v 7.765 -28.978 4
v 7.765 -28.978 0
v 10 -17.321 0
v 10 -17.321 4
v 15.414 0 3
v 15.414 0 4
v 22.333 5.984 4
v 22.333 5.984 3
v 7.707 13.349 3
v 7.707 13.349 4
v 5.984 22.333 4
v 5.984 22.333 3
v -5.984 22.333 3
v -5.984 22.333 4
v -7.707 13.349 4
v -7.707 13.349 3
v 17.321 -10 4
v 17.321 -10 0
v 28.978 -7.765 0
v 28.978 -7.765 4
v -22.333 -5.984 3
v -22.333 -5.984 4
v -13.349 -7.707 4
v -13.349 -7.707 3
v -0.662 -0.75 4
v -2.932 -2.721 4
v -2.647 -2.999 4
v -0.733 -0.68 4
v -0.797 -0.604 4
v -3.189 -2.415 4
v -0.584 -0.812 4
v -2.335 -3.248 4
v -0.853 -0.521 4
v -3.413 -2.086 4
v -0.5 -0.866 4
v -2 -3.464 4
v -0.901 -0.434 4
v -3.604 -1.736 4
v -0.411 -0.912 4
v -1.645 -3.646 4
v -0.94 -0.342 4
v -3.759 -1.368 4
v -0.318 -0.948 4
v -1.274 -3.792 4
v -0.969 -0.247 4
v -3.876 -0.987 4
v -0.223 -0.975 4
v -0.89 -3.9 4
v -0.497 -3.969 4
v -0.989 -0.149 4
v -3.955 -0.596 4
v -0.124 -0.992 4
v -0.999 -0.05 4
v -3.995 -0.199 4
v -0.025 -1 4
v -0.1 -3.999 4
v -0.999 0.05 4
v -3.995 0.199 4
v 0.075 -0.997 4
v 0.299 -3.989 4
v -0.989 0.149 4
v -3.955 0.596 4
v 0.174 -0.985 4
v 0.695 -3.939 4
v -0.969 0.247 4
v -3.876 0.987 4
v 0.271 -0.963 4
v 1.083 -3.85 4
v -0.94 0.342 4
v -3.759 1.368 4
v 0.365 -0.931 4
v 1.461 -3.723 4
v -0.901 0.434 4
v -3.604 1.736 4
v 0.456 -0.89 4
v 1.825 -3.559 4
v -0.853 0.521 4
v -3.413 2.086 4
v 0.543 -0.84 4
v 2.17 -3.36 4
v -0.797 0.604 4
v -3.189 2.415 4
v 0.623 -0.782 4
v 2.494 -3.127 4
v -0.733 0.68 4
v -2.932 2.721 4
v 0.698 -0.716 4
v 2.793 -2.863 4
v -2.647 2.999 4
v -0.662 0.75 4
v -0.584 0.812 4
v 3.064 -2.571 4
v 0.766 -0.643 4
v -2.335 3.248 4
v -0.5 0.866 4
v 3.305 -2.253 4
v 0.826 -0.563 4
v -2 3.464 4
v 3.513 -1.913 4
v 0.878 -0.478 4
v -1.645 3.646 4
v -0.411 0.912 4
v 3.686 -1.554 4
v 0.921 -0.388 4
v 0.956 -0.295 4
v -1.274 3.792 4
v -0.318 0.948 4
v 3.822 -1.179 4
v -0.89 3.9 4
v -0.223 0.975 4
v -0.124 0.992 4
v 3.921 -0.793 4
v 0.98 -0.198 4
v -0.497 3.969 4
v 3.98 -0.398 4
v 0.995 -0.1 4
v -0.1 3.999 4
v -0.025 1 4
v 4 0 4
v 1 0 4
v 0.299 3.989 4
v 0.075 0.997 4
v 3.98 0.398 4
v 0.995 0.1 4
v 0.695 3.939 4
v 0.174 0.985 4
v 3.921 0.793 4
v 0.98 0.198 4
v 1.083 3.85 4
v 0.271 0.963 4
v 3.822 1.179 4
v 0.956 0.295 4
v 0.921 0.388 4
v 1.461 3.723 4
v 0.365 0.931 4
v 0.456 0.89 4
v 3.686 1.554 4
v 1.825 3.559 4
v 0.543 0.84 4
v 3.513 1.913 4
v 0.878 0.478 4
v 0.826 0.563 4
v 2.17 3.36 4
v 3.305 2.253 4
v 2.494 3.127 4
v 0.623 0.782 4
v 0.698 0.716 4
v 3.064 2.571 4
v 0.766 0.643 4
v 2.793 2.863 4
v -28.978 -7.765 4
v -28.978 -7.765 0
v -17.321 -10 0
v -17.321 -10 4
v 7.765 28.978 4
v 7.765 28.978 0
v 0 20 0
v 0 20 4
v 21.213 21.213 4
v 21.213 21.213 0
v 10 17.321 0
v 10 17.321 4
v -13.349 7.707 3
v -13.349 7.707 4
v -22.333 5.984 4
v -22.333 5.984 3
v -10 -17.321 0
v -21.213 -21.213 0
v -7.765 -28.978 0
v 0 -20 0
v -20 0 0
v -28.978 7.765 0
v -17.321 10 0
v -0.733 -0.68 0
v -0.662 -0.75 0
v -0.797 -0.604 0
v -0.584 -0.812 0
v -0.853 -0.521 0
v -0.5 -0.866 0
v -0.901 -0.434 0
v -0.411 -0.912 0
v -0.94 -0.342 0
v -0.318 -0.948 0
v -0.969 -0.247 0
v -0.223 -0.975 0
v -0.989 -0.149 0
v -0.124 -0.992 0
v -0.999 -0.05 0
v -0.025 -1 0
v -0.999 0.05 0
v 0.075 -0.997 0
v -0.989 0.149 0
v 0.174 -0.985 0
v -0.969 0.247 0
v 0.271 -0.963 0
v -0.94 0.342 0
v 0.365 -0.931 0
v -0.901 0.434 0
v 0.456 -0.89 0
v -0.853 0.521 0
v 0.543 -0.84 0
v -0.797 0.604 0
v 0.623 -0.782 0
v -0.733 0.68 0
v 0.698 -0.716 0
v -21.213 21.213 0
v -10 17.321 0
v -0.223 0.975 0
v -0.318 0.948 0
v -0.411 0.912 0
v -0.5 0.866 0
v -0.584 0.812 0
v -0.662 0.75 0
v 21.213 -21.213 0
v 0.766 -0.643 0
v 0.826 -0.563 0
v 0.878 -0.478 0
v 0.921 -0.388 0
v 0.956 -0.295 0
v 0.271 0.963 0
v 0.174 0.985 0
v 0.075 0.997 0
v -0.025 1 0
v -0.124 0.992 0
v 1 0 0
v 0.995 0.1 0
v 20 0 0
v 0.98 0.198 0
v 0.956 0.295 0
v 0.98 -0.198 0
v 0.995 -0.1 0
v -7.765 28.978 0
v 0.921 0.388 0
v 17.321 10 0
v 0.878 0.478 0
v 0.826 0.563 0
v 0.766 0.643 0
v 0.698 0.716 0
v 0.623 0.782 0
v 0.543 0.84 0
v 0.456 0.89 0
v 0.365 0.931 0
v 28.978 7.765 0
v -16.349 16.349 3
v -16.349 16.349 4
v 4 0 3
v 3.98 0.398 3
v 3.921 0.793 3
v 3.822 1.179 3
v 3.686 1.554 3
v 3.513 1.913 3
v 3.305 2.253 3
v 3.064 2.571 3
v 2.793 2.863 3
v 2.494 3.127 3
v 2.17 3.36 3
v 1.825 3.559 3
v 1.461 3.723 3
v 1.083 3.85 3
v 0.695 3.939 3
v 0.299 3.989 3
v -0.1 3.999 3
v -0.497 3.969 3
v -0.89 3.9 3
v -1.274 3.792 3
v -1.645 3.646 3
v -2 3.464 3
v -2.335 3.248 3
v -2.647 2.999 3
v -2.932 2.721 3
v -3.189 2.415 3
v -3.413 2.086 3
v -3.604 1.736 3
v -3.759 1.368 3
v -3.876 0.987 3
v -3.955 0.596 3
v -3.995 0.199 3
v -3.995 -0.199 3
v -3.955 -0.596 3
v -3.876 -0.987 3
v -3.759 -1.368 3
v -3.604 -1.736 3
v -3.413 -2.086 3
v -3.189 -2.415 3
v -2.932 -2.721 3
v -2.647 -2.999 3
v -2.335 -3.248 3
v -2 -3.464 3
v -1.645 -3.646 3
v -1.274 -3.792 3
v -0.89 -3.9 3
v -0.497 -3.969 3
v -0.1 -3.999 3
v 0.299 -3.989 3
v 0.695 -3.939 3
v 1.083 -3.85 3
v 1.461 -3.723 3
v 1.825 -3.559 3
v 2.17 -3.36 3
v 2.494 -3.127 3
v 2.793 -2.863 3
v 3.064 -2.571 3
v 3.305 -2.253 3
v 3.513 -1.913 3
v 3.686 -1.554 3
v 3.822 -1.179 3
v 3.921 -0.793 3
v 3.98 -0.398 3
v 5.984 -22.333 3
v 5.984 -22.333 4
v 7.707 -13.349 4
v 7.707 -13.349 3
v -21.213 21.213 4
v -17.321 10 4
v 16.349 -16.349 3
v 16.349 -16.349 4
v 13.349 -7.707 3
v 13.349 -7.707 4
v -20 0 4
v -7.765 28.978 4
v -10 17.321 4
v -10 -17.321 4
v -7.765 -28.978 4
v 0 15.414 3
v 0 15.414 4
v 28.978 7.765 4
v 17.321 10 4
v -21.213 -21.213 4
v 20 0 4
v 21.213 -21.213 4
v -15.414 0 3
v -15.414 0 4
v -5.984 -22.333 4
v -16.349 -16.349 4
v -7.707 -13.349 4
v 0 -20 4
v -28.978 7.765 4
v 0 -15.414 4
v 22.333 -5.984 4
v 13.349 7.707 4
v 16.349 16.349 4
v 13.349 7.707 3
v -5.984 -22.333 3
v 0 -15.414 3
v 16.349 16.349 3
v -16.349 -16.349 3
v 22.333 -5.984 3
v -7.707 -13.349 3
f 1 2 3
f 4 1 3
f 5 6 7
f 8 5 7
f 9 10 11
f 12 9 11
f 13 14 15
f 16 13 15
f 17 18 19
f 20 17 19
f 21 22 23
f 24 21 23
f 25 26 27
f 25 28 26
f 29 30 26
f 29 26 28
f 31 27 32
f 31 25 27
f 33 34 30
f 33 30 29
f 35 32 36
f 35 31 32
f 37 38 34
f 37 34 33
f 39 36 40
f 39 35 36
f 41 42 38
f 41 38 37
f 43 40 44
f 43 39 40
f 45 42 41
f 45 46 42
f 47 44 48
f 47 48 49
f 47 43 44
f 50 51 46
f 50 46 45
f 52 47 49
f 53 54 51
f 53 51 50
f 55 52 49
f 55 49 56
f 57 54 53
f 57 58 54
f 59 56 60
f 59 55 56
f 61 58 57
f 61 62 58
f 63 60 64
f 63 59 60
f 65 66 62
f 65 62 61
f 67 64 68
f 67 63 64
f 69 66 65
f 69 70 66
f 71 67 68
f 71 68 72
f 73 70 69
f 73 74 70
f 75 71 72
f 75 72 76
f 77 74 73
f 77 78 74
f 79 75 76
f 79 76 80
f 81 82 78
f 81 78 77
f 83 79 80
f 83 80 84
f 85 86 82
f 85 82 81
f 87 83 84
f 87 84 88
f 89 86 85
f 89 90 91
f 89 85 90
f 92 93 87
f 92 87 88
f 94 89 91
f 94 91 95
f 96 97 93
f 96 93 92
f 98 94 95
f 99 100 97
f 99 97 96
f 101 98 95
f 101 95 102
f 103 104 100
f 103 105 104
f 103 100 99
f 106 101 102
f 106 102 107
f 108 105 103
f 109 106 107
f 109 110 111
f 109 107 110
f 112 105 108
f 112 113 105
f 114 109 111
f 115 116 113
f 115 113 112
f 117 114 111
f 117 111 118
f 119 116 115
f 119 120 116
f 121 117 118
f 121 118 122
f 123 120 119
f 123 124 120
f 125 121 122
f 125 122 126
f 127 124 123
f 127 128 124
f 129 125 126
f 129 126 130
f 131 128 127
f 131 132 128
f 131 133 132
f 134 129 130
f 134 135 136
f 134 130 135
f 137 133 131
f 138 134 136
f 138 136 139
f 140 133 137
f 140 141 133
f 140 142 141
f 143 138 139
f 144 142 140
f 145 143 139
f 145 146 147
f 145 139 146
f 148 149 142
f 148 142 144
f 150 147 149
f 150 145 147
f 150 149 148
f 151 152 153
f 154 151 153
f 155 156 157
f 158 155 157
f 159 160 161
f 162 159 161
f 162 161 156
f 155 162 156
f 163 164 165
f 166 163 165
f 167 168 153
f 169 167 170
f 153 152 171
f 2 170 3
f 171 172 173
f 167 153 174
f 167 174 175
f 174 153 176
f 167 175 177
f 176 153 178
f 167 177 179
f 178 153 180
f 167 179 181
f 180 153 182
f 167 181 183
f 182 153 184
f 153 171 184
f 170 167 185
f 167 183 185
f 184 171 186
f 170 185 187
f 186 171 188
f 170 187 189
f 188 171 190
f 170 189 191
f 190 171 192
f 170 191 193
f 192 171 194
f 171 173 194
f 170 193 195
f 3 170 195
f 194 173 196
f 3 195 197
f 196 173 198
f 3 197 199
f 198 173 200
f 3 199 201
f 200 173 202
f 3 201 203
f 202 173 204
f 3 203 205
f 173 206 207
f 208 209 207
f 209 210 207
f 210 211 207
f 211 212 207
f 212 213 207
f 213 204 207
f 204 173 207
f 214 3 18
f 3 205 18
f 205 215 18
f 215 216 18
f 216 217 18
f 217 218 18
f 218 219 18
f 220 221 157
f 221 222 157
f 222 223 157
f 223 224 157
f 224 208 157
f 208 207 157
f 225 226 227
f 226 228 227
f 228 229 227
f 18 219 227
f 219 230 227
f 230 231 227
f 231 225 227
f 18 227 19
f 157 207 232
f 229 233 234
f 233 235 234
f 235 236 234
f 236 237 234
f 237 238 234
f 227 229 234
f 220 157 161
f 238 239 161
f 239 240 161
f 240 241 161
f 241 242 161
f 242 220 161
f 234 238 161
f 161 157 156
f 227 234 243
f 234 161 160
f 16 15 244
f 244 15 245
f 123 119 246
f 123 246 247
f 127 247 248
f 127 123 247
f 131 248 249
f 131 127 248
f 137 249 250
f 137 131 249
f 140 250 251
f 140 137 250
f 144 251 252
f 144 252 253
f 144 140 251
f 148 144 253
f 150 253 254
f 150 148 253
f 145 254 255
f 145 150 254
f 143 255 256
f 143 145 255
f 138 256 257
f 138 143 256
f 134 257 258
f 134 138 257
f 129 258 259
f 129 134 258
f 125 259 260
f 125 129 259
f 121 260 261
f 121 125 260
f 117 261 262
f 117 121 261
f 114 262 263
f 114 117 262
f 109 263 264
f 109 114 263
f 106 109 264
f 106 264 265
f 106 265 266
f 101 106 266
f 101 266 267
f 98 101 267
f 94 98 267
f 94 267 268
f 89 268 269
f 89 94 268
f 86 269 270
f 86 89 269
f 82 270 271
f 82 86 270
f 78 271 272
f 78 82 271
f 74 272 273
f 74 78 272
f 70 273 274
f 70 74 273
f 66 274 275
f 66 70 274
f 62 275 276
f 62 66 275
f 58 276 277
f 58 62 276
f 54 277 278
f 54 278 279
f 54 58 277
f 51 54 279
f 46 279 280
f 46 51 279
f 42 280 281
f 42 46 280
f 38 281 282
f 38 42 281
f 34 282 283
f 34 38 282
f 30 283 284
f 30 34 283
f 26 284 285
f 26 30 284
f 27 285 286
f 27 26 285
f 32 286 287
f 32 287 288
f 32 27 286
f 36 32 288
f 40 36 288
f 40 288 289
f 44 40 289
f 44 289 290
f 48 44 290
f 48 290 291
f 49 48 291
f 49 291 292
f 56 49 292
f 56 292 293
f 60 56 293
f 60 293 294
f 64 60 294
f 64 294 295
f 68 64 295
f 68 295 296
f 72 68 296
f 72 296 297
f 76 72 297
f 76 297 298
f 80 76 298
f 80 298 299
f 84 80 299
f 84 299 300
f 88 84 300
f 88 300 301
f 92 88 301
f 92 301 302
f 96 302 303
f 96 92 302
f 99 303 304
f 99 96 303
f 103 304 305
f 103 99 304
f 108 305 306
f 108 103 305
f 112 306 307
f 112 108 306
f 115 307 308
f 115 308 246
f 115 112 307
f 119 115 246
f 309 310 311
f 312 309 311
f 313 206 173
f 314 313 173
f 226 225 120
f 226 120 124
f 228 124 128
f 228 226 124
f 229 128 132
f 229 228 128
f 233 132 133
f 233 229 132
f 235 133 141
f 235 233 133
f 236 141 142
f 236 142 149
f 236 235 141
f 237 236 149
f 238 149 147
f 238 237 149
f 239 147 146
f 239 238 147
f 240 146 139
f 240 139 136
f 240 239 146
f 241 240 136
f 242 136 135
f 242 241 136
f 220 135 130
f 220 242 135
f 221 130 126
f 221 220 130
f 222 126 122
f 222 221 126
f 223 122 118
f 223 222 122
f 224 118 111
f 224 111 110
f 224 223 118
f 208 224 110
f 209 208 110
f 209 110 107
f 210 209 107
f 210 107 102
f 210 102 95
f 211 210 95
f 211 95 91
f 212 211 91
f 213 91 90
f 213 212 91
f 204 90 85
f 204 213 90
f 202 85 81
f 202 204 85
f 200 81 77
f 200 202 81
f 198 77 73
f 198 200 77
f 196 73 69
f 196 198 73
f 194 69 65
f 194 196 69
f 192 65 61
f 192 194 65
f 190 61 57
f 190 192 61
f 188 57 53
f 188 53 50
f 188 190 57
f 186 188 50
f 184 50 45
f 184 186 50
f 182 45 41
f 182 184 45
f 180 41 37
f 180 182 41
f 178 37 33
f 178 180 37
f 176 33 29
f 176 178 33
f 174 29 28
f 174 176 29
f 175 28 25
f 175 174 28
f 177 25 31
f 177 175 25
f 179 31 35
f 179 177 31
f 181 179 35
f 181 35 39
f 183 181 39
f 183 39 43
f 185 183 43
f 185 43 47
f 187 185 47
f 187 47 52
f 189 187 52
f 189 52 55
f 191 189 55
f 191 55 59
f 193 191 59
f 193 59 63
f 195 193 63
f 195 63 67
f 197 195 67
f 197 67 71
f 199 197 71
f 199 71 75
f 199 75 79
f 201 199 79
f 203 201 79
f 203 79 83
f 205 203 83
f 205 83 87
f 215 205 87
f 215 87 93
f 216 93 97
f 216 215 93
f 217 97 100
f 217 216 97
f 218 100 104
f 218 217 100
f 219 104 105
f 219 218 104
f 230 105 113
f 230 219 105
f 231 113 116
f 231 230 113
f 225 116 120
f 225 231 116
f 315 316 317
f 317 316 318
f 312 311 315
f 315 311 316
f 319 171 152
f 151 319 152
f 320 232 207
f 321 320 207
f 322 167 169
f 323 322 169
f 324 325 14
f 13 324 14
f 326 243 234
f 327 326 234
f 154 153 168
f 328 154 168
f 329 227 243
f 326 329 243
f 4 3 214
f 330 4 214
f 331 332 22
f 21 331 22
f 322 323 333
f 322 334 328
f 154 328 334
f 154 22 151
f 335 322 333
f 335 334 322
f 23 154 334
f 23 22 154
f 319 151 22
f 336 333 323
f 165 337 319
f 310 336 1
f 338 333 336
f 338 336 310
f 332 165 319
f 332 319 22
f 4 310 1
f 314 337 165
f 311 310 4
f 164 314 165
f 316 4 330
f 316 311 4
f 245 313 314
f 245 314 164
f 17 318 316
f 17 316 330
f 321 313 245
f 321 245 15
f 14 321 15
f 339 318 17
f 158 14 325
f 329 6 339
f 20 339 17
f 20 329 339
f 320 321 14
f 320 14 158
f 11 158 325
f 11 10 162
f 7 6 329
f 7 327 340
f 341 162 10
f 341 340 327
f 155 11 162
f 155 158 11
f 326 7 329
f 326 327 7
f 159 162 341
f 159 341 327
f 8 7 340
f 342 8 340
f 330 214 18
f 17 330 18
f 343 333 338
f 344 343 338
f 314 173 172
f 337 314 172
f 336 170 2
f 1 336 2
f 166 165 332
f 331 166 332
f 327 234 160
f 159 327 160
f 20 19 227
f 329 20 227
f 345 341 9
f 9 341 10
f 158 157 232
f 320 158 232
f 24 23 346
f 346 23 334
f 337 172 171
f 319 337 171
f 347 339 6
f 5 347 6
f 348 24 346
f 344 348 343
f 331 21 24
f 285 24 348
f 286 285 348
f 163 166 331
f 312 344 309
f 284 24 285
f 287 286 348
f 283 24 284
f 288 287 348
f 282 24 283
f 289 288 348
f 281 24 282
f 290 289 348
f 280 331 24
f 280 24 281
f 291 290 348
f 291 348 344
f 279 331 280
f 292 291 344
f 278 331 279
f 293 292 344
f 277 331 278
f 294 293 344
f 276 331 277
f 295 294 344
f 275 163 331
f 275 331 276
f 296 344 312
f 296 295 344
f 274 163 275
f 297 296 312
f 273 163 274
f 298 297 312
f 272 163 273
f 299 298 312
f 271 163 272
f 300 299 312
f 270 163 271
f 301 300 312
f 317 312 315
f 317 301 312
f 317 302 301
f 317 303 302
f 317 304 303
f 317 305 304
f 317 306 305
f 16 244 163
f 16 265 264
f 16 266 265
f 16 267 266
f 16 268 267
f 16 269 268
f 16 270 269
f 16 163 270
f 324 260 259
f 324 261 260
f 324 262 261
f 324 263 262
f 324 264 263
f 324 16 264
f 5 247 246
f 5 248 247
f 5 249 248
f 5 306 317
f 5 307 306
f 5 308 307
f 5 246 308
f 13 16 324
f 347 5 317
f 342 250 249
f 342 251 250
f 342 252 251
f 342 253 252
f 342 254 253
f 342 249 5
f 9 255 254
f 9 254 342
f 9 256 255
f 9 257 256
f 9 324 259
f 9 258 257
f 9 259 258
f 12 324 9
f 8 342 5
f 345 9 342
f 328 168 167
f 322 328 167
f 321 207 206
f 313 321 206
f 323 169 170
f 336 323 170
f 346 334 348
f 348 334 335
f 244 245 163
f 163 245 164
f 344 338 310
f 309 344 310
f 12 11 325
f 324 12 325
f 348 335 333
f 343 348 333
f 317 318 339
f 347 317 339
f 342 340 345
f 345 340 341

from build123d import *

# Parameters (mm, degrees)
F0_R     = 1
F1_DEPTH = 4
F2_R     = 4
F3_DEPTH = 1


with BuildPart() as f1:
    # F0 (on Top) → F1 (new body)
    with BuildSketch(Plane.XY):
        Polygon((7.764571, 28.977775), (0, 20), (-7.764571, 28.977775), (-10, 17.320508), (-21.213203, 21.213203), (-17.320508, 10), (-28.977775, 7.764571), (-20, 0), (-28.977775, -7.764571), (-17.320508, -10), (-21.213203, -21.213203), (-10, -17.320508), (-7.764571, -28.977775), (0, -20), (7.764571, -28.977775), (10, -17.320508), (21.213203, -21.213203), (17.320508, -10), (28.977775, -7.764571), (20, 0), (28.977775, 7.764571), (17.320508, 10), (21.213203, 21.213203), (10, 17.320508), align=None)
        Circle(F0_R, mode=Mode.SUBTRACT)
    extrude(amount=F1_DEPTH)

    # F2 (on face) → F3 (cut)
    with BuildSketch(Plane.XY.offset(4)):
        Polygon((-13.34884, -7.706956), (-16.348923, -16.348923), (-7.706956, -13.34884), (-5.984121, -22.333044), (0, -15.413913), (5.984121, -22.333044), (7.706956, -13.34884), (16.348923, -16.348923), (13.34884, -7.706956), (22.333044, -5.984121), (15.413913, 0), (22.333044, 5.984121), (13.34884, 7.706956), (16.348923, 16.348923), (7.706956, 13.34884), (5.984121, 22.333044), (0, 15.413913), (-5.984121, 22.333044), (-7.706956, 13.34884), (-16.348923, 16.348923), (-13.34884, 7.706956), (-22.333044, 5.984121), (-15.413913, 0), (-22.333044, -5.984121), align=None)
        Circle(F2_R, mode=Mode.SUBTRACT)
    extrude(amount=-F3_DEPTH, mode=Mode.SUBTRACT)


solid = f1.part
